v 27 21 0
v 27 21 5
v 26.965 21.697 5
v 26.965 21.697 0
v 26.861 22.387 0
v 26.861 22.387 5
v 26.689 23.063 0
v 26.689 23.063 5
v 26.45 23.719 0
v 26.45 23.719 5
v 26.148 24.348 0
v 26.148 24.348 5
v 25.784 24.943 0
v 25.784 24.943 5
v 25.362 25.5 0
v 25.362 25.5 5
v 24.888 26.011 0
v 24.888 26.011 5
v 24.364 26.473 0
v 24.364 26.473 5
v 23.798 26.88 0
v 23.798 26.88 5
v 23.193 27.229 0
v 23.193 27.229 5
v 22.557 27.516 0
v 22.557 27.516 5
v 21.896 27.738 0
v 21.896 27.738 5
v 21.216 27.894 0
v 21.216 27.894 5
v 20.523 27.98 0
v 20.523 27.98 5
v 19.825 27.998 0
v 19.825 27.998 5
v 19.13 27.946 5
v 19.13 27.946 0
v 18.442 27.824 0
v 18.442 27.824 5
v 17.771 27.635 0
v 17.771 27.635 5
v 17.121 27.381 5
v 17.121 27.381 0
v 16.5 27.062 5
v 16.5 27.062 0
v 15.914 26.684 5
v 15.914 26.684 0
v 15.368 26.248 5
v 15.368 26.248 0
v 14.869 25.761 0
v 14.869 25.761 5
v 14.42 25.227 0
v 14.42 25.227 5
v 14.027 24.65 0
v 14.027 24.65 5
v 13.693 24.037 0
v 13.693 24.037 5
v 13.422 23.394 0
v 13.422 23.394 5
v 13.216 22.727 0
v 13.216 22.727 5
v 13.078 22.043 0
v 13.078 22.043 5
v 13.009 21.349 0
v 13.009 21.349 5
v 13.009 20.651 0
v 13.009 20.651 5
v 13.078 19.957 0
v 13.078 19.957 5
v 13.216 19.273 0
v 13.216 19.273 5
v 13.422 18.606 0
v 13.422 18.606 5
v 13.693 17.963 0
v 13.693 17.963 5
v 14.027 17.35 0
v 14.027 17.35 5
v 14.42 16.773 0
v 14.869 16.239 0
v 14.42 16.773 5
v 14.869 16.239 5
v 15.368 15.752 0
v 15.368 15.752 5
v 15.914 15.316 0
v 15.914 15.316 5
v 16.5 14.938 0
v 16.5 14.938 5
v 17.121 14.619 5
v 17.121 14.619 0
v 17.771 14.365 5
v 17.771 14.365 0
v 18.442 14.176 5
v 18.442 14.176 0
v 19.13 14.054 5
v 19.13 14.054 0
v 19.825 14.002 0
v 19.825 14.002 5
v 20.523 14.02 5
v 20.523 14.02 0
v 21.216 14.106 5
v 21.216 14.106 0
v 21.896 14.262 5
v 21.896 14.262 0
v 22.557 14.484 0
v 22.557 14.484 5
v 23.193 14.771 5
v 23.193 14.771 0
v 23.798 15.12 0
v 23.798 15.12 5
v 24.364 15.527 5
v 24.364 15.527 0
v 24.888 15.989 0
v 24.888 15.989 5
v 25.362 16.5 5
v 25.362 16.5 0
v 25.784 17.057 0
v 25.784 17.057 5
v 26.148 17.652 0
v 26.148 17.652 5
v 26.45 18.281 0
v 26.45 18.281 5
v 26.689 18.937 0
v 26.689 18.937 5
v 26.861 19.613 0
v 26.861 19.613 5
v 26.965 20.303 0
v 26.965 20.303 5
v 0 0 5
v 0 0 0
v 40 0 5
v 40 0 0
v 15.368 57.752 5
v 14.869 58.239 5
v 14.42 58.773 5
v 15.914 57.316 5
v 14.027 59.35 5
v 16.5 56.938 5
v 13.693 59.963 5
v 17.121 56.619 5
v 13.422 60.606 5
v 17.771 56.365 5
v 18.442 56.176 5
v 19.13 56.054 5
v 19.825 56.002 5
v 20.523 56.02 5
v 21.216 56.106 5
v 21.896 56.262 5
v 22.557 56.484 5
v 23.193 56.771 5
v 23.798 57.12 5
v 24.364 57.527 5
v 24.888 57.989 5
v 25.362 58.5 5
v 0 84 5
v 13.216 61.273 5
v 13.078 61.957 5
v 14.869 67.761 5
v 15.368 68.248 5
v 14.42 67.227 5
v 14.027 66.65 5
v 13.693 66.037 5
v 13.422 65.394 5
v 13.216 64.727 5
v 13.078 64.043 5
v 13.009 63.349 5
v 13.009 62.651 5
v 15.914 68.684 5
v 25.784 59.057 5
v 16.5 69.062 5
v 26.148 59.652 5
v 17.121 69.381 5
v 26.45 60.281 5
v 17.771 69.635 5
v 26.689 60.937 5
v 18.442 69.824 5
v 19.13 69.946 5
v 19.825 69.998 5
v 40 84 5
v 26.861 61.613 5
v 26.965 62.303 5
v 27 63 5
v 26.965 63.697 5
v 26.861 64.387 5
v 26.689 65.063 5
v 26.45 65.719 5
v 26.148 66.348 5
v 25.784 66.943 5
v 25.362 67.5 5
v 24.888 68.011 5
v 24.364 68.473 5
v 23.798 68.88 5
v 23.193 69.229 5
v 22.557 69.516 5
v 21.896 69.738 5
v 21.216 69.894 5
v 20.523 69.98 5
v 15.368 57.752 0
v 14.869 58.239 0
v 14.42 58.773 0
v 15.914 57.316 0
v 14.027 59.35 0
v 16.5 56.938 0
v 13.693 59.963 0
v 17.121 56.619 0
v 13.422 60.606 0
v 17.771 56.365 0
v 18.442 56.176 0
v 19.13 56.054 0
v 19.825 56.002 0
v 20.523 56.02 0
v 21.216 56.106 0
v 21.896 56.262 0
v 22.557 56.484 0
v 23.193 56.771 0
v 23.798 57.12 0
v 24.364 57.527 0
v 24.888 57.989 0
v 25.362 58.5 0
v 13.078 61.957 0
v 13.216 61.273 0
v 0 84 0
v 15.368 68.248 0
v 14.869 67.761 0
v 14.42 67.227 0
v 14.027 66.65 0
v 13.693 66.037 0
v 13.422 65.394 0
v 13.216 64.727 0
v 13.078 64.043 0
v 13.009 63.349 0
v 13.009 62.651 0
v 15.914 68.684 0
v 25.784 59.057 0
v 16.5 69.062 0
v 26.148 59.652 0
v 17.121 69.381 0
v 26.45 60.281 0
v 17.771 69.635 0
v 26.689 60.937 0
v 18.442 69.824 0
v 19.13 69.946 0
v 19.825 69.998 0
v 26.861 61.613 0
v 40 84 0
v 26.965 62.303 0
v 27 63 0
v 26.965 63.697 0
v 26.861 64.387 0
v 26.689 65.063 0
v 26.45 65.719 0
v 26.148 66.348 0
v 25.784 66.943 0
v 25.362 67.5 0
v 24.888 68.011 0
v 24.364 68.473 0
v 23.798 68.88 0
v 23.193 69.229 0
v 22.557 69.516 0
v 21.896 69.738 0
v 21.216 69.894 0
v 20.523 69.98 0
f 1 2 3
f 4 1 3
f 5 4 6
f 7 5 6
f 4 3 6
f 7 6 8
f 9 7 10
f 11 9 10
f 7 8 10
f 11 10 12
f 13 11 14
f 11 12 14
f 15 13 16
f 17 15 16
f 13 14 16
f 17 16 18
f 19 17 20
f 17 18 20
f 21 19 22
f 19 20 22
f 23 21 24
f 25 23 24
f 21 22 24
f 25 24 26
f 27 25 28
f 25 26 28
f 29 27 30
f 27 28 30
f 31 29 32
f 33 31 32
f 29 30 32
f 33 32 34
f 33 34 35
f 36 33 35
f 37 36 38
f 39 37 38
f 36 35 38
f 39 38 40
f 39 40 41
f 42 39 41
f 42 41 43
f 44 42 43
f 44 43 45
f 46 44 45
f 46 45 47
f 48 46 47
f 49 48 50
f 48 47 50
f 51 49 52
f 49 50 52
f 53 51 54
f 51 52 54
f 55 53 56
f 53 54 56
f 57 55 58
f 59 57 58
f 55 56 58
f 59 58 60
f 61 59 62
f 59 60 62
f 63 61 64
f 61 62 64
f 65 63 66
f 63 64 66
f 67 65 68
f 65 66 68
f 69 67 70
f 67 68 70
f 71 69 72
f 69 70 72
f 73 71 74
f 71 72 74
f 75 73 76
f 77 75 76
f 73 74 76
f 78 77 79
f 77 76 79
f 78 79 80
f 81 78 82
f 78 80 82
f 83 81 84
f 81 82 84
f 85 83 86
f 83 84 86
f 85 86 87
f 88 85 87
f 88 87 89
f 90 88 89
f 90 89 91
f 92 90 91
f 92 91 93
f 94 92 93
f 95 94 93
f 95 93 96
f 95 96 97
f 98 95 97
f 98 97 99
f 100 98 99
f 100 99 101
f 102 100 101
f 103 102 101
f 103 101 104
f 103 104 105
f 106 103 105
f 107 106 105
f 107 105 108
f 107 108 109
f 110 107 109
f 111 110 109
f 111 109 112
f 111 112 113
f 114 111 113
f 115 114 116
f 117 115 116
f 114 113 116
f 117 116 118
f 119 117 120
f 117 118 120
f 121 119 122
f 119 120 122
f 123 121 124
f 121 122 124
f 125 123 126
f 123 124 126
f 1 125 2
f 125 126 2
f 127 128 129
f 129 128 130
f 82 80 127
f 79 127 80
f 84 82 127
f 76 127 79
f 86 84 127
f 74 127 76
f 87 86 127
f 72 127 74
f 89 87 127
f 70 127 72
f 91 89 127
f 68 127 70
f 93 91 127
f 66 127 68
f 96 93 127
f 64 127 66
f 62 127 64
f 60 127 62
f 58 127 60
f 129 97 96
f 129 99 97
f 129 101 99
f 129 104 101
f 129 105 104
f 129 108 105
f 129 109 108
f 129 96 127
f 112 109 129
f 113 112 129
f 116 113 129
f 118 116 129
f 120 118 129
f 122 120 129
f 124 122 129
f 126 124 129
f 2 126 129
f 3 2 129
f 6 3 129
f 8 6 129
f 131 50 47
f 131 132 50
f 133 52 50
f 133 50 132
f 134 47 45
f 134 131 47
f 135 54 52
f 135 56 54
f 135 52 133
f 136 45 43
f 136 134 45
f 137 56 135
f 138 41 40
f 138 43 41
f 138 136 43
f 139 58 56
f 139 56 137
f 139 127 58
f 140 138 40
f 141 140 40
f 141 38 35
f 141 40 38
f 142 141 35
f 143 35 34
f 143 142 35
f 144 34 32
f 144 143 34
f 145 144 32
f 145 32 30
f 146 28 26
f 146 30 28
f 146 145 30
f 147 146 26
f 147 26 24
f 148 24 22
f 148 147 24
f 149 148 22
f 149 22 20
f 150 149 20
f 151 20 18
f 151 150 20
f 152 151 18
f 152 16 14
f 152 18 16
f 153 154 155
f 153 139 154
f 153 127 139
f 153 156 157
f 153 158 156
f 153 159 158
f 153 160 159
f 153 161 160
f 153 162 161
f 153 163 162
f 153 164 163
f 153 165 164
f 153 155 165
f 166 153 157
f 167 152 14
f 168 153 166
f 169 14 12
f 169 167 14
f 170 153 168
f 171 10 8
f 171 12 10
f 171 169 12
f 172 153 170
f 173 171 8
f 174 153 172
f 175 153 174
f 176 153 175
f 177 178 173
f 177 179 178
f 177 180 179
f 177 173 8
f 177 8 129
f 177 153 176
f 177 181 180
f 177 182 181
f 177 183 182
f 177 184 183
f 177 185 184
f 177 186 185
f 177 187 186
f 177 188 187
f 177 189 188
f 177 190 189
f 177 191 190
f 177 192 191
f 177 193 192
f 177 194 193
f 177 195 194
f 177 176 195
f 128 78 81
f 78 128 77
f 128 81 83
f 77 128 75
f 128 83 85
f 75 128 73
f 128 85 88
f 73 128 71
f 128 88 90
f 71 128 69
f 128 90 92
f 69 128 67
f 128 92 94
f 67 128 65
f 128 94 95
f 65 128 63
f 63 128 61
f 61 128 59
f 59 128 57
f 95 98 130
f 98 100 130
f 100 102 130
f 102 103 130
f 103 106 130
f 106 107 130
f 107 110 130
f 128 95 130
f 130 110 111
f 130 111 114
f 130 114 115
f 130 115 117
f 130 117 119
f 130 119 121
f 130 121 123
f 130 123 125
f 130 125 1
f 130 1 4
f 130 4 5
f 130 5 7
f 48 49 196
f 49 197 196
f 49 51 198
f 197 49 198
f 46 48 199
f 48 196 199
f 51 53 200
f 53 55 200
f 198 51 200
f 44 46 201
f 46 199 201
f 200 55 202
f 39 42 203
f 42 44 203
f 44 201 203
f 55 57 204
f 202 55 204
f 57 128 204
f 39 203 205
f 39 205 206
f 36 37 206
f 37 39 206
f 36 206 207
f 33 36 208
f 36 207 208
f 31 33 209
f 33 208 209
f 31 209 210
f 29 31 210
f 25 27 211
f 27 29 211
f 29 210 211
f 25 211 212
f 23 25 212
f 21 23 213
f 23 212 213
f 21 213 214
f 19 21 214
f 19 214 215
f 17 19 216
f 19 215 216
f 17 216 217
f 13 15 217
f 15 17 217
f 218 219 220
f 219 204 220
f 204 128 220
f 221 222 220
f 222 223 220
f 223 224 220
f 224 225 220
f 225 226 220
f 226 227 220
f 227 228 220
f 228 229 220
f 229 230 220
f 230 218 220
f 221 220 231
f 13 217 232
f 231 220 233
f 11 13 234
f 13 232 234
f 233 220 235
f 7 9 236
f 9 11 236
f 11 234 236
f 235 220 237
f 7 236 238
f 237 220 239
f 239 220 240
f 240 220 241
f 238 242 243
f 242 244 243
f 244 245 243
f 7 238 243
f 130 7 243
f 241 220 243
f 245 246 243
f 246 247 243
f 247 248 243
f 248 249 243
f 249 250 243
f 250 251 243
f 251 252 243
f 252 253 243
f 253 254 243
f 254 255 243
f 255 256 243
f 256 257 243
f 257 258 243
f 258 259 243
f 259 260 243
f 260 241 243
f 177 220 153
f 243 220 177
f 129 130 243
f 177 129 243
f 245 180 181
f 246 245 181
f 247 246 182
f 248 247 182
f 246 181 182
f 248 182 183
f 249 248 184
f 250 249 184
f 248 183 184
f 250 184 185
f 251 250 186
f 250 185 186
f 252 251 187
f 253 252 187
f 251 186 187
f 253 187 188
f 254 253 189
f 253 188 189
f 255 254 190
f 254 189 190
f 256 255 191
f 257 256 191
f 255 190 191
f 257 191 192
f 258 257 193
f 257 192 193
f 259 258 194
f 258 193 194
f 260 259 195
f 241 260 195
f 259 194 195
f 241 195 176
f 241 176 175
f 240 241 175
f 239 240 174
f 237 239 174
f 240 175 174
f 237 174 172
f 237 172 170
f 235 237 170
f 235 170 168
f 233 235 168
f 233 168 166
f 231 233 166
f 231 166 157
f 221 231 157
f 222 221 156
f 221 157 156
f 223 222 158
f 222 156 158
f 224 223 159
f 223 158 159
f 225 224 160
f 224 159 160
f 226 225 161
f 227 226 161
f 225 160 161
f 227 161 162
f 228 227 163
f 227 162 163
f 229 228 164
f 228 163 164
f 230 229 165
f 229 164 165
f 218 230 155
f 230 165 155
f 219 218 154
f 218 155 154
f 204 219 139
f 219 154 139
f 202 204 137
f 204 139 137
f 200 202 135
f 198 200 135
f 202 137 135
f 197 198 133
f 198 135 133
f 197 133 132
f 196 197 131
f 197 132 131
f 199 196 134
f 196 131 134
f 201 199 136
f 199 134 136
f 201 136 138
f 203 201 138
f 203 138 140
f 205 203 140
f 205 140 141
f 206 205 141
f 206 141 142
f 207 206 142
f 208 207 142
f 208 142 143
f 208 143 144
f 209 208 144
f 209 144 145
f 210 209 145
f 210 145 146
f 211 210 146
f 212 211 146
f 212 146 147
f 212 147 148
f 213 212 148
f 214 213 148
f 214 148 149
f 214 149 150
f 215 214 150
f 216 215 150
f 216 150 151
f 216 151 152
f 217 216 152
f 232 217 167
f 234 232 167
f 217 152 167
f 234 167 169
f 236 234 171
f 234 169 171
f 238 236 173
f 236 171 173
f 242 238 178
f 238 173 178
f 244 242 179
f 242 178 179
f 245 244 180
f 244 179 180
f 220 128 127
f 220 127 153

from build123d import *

# Parameters (mm, degrees)
CROQUIS4_W              = 40
CROQUIS4_H              = 84
SALIENTE_EXTRUIR3_DEPTH = 5
CROQUIS5_R              = 7
CORTAR_EXTRUIR1_DEPTH   = 5
CROQUIS5_3_R            = 7
CORTAR_EXTRUIR2_DEPTH   = 5


with BuildPart() as part:
    # Croquis4 → Saliente-Extruir3 (new body)
    with BuildSketch(Plane.XY):
        with Locations((20, 42)):
            Rectangle(CROQUIS4_W, CROQUIS4_H)
    extrude(amount=SALIENTE_EXTRUIR3_DEPTH)

    # Croquis5 → Cortar-Extruir1 (cut)
    with BuildSketch(Plane.XY.offset(5)):
        with Locations((20, 63)):
            Circle(CROQUIS5_R)
    extrude(amount=-CORTAR_EXTRUIR1_DEPTH, mode=Mode.SUBTRACT)

    # Croquis5<3> → Cortar-Extruir2 (cut)
    with BuildSketch(Plane.XY.offset(5)):
        with Locations((20, 21)):
            Circle(CROQUIS5_3_R)
    extrude(amount=-CORTAR_EXTRUIR2_DEPTH, mode=Mode.SUBTRACT)


solid = part.part
